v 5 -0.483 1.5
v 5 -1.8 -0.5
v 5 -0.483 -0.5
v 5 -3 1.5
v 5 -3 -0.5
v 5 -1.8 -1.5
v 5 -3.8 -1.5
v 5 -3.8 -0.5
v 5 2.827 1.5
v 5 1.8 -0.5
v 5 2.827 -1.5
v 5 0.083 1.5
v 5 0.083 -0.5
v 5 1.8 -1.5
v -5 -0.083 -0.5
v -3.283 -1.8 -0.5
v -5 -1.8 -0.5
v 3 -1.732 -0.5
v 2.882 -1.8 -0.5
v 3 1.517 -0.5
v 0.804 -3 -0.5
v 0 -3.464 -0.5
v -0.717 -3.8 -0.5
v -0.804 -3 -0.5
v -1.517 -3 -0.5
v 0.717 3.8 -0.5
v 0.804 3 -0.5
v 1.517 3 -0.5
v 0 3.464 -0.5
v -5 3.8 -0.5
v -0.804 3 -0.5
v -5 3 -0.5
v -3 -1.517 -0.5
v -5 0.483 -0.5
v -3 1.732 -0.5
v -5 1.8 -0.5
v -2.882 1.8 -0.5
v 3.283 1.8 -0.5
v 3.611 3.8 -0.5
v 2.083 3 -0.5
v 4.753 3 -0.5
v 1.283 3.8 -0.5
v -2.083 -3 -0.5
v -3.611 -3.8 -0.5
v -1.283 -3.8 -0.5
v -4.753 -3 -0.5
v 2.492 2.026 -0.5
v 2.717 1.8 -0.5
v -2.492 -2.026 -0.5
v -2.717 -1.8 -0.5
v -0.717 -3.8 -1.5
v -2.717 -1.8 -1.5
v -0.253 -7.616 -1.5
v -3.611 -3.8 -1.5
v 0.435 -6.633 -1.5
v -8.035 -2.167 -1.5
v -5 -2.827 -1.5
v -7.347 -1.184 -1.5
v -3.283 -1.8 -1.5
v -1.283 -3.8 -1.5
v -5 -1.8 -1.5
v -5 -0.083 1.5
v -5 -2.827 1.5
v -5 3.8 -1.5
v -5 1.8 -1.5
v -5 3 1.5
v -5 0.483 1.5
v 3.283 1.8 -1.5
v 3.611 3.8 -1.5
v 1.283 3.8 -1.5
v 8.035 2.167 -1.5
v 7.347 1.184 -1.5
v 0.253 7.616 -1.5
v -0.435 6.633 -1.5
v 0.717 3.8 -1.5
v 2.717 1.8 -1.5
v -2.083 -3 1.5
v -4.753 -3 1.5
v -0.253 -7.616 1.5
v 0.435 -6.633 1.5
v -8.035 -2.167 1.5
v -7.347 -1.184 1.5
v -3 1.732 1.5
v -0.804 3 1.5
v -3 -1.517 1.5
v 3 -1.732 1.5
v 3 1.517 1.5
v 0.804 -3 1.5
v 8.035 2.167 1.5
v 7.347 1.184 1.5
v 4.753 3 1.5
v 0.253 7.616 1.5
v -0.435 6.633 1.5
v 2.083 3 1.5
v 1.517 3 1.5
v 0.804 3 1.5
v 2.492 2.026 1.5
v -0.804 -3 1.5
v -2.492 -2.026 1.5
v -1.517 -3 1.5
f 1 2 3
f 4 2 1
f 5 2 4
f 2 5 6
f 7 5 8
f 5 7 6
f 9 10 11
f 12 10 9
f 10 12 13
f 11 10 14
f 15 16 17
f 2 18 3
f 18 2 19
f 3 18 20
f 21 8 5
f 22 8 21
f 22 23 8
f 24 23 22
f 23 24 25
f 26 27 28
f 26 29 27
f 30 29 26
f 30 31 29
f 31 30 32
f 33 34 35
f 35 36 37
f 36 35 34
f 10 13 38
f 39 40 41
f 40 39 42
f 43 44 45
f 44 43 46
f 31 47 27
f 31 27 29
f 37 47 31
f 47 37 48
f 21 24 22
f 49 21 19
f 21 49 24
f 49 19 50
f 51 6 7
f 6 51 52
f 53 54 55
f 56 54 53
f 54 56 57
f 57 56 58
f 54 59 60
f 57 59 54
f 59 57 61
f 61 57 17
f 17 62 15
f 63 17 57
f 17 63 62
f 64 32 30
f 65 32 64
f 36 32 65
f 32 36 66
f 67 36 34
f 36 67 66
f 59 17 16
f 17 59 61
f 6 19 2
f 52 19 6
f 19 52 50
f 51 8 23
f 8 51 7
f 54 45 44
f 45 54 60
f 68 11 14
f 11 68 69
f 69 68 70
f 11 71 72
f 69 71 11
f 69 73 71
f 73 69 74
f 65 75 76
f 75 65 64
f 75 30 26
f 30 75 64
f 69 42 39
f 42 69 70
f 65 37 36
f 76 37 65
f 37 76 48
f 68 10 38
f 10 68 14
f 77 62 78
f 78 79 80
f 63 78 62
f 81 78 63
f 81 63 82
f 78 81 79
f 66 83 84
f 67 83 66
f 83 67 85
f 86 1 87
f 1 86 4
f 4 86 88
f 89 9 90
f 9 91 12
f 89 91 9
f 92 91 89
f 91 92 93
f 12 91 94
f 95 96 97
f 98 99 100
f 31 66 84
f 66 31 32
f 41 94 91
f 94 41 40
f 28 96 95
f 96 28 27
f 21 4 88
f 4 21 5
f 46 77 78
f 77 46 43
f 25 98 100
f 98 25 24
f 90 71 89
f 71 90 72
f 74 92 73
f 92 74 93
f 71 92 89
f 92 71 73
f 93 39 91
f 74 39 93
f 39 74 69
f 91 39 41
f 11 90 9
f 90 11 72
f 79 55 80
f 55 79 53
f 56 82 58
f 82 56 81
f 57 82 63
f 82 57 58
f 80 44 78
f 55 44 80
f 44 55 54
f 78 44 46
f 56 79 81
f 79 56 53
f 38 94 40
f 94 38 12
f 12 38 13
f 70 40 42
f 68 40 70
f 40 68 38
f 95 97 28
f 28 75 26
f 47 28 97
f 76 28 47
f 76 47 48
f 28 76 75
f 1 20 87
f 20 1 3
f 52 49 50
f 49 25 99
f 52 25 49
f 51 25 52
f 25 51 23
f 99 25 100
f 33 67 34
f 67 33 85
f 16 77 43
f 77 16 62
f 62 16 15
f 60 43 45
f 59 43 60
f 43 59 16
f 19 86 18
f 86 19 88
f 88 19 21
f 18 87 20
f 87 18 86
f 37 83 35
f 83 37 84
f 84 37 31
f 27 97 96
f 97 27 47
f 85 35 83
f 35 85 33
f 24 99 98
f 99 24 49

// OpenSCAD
// T-slot nut (single connected solid) for:
// - 3.0mm screw (clearance hole by default)
// - 6.0mm across flats (hex pocket on top face)
// - 3.0mm thick overall

// -------- Parameters --------
screw_d            = 3.0;   // screw nominal diameter
clearance_d        = 3.2;   // through-hole clearance for M3
across_flats       = 6.0;   // hex across flats
thickness          = 3.0;   // total nut thickness (overall)

body_length        = 10.0;  // along slot
neck_width         = 6.0;   // top/neck width (slot opening)
cavity_width       = 10.0;  // bottom/cavity width (slot undercut)

wing_height        = 1.0;   // height of the wider bottom "T" section
chamfer            = 0.4;   // end chamfer size

// Guaranteed overlap for connectivity (1-2mm as required)
overlap            = 1.2;

hex_pocket_depth   = 2.0;   // depth from top face down

$fn = 64;

// -------- Helpers --------
function hex_circumradius_from_af(af) = (af/2)/cos(30); // R such that across flats = af

module hex_prism(af, h, center=false) {
    cylinder(r=hex_circumradius_from_af(af), h=h, center=center, $fn=6);
}

// -------- Model --------
module tslot_nut() {
    wing_each_w = max(0, (cavity_width - neck_width)/2);

    top_h = max(0.01, thickness - wing_height);
    bot_h = min(wing_height, thickness);

    top_z =  thickness/2 - top_h/2;     // flush to top
    bot_z = -thickness/2 + bot_h/2;     // flush to bottom

    // --- Diagonal side rails (must be physically fused to body) ---
    // Make them intersect the body in Y by pushing their inner edge inside the body's max half-width.
    strip_len   = body_length * 0.95;
    strip_w     = 1.2;
    strip_h     = thickness;            // full thickness => guaranteed Z intersection
    strip_angle = 35;

    body_half_x = body_length/2;
    body_half_y = max(neck_width, cavity_width)/2;

    // Place rail centers so their INNER edge is inside the body by 'overlap'
    // inner_edge_y = strip_cy - strip_w/2  <= body_half_y - overlap
    strip_cy = body_half_y - overlap + strip_w/2;

    // Keep them near the ends in X but still intersecting the body volume
    strip_cx = body_half_x - overlap;

    difference() {
        union() {
            // Top/neck block
            translate([0, 0, top_z])
                cube([body_length, neck_width, top_h], center=true);

            // Bottom wings (wider)
            if (wing_each_w > 0) {
                // Overlap wings into neck by 'overlap' in Y to avoid any seam/gap
                translate([0, -(neck_width/2 + wing_each_w/2 - overlap), bot_z])
                    cube([body_length, wing_each_w, bot_h], center=true);

                translate([0,  (neck_width/2 + wing_each_w/2 - overlap), bot_z])
                    cube([body_length, wing_each_w, bot_h], center=true);
            } else {
                translate([0, 0, bot_z])
                    cube([body_length, neck_width, bot_h], center=true);
            }

            // Diagonal rail near +Y side (ATTACHED: overlaps body in Y by 'overlap')
            translate([ strip_cx,  strip_cy, 0])
                rotate([0, 0, -strip_angle])
                    cube([strip_len, strip_w, strip_h], center=true);

            // Diagonal rail near -Y side (ATTACHED: overlaps body in Y by 'overlap')
            translate([-strip_cx, -strip_cy, 0])
                rotate([0, 0, -strip_angle])
                    cube([strip_len, strip_w, strip_h], center=true);
        }

        // End chamfers
        chamfer_cut_w = cavity_width + 2;
        chamfer_cut_h = thickness + 2;

        translate([ body_length/2 - chamfer/2, 0, 0])
            rotate([0, 0, 45])
                cube([chamfer, chamfer_cut_w, chamfer_cut_h], center=true);

        translate([-body_length/2 + chamfer/2, 0, 0])
            rotate([0, 0, 45])
                cube([chamfer, chamfer_cut_w, chamfer_cut_h], center=true);

        // Through hole for M3 screw (clearance)
        cylinder(d=clearance_d, h=thickness + 2, center=true);

        // Hex pocket on top face (open to top only)
        translate([0, 0, thickness/2 - hex_pocket_depth/2 + overlap])
            rotate([0, 0, 30])
                hex_prism(across_flats, hex_pocket_depth + 2*overlap, center=true);
    }
}

tslot_nut();
